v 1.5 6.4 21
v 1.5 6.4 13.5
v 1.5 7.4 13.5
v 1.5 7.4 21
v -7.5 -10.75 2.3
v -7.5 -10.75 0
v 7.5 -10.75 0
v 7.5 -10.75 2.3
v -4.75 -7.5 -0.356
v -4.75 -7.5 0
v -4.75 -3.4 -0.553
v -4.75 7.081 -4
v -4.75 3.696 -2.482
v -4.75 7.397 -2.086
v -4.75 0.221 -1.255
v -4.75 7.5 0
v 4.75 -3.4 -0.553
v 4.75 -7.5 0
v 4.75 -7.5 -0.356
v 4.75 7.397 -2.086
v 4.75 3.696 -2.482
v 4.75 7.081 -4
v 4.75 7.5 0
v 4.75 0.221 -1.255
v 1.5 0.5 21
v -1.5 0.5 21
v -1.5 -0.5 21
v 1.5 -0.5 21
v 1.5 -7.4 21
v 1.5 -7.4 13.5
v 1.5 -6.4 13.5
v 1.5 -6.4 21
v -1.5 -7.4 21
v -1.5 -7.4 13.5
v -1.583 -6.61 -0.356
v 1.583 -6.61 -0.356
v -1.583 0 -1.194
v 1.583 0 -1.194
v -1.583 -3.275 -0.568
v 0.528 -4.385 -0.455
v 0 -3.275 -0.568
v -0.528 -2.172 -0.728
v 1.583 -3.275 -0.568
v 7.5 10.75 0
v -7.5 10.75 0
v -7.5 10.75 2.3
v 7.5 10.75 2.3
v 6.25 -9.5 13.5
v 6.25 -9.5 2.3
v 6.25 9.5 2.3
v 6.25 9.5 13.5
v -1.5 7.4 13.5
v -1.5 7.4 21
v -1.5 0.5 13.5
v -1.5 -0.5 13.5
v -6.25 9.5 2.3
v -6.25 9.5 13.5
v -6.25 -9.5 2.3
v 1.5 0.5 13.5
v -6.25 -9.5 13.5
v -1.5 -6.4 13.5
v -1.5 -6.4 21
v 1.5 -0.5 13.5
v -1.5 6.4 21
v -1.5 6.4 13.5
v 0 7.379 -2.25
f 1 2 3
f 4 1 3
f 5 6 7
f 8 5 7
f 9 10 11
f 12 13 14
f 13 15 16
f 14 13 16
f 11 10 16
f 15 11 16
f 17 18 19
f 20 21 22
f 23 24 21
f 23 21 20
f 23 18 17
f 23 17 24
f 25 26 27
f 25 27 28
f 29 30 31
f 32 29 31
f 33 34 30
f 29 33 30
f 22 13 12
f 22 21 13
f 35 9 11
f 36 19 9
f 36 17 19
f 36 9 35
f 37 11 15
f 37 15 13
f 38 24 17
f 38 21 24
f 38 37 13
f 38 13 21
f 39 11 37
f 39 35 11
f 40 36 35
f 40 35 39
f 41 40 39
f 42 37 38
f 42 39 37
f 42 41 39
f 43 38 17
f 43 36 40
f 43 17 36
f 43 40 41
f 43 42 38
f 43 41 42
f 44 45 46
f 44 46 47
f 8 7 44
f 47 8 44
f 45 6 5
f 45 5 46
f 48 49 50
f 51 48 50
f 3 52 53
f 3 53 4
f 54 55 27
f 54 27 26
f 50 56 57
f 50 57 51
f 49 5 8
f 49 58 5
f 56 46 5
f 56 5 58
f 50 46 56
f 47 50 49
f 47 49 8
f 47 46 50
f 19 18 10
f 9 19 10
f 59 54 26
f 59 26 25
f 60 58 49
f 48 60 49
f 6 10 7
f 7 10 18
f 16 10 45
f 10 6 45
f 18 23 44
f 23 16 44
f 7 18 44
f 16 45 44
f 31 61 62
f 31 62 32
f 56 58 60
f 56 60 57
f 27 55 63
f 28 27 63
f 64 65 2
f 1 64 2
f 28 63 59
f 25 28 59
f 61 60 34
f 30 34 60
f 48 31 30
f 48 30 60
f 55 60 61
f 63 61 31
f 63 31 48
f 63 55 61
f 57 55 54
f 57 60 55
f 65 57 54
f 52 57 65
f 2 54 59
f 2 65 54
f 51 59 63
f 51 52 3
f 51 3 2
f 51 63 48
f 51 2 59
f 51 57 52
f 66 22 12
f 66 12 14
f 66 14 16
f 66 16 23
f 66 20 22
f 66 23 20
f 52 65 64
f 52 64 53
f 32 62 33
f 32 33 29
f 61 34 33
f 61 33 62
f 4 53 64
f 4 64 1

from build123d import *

# Parameters (mm, degrees)
SKETCH_1_W          = 15
SKETCH_1_H          = 21.5
EXTRUDE_1_DEPTH     = 2.3
SKETCH_2_W          = 12.5
SKETCH_2_H          = 19
EXTRUDE_2_DEPTH     = 11.2
SKETCH_3_W          = 9.5
SKETCH_3_H          = 15
EXTRUDE_3_DEPTH     = 4
CUT_EXTRUDE_START   = -9.5
CUT_EXTRUDE_1_DEPTH = 9.5
SKETCH_6_W          = 3
SKETCH_6_H          = 1
EXTRUDE_1_2_DEPTH   = 7.5


# Read off the part's stored shape, not the designer's step: 切除-拉伸1
with BuildPart() as part:
    # 草图1 → Extrude 1 (new body)
    with BuildSketch(Plane.XY):
        Rectangle(SKETCH_1_W, SKETCH_1_H)
    extrude(amount=EXTRUDE_1_DEPTH)

    # 草图2 → 拉伸2 (add)
    with BuildSketch(Plane.XY.offset(2.3)):
        Rectangle(SKETCH_2_W, SKETCH_2_H)
    extrude(amount=EXTRUDE_2_DEPTH)

    # 草图3 → 拉伸3 (add)
    with BuildSketch(Plane(origin=(0, 0, 0), x_dir=(-1, 0, 0), z_dir=(0, 0, -1))):
        Rectangle(SKETCH_3_W, SKETCH_3_H)
    extrude(amount=EXTRUDE_3_DEPTH)

    # 切除-拉伸1 outline → 切除-拉伸1 (cut)
    with BuildSketch(Plane.ZY.offset(4.75).offset(CUT_EXTRUDE_START)):
        with BuildLine():
            Line((-4, -7.5), (-0.355698538, -7.5))
            add(Edge.make_bspline(
                [(-0.355698538, -7.5), (-0.354349182, -7.203584733), (-0.342893084, -4.687006069), (-0.90591647, 0.423075599), (-2.923742076, 4.765110149), (-4, 7.081043238)],
                knots=[0, 0, 0, 0, 0.058645761, 0.497905094, 1, 1, 1, 1], degree=3))
            Line((-4, 7.081043238), (-4, -7.5))
        make_face()
        with BuildLine():
            Line((-4, 7.5), (-4, 7.081043238))
            add(Edge.make_bspline(
                [(-4, 7.081043238), (-3.418318642, 7.19501669), (-2.098267317, 7.453664838), (-0.752663012, 7.483379257), (0, 7.5)],
                knots=[0, 0, 0, 0, 0.440650562, 1, 1, 1, 1], degree=3))
            Line((0, 7.5), (-4, 7.5))
        make_face()
    extrude(amount=CUT_EXTRUDE_1_DEPTH, mode=Mode.SUBTRACT)

    # 草图6 → Extrude 1 2 (add)
    with BuildSketch(Plane.XY.offset(13.5)):
        Rectangle(SKETCH_6_W, SKETCH_6_H)
        with Locations((0, 6.9)):
            Rectangle(SKETCH_6_W, SKETCH_6_H)
        with Locations((0, -6.9)):
            Rectangle(SKETCH_6_W, SKETCH_6_H)
    extrude(amount=EXTRUDE_1_2_DEPTH)


solid = part.part
